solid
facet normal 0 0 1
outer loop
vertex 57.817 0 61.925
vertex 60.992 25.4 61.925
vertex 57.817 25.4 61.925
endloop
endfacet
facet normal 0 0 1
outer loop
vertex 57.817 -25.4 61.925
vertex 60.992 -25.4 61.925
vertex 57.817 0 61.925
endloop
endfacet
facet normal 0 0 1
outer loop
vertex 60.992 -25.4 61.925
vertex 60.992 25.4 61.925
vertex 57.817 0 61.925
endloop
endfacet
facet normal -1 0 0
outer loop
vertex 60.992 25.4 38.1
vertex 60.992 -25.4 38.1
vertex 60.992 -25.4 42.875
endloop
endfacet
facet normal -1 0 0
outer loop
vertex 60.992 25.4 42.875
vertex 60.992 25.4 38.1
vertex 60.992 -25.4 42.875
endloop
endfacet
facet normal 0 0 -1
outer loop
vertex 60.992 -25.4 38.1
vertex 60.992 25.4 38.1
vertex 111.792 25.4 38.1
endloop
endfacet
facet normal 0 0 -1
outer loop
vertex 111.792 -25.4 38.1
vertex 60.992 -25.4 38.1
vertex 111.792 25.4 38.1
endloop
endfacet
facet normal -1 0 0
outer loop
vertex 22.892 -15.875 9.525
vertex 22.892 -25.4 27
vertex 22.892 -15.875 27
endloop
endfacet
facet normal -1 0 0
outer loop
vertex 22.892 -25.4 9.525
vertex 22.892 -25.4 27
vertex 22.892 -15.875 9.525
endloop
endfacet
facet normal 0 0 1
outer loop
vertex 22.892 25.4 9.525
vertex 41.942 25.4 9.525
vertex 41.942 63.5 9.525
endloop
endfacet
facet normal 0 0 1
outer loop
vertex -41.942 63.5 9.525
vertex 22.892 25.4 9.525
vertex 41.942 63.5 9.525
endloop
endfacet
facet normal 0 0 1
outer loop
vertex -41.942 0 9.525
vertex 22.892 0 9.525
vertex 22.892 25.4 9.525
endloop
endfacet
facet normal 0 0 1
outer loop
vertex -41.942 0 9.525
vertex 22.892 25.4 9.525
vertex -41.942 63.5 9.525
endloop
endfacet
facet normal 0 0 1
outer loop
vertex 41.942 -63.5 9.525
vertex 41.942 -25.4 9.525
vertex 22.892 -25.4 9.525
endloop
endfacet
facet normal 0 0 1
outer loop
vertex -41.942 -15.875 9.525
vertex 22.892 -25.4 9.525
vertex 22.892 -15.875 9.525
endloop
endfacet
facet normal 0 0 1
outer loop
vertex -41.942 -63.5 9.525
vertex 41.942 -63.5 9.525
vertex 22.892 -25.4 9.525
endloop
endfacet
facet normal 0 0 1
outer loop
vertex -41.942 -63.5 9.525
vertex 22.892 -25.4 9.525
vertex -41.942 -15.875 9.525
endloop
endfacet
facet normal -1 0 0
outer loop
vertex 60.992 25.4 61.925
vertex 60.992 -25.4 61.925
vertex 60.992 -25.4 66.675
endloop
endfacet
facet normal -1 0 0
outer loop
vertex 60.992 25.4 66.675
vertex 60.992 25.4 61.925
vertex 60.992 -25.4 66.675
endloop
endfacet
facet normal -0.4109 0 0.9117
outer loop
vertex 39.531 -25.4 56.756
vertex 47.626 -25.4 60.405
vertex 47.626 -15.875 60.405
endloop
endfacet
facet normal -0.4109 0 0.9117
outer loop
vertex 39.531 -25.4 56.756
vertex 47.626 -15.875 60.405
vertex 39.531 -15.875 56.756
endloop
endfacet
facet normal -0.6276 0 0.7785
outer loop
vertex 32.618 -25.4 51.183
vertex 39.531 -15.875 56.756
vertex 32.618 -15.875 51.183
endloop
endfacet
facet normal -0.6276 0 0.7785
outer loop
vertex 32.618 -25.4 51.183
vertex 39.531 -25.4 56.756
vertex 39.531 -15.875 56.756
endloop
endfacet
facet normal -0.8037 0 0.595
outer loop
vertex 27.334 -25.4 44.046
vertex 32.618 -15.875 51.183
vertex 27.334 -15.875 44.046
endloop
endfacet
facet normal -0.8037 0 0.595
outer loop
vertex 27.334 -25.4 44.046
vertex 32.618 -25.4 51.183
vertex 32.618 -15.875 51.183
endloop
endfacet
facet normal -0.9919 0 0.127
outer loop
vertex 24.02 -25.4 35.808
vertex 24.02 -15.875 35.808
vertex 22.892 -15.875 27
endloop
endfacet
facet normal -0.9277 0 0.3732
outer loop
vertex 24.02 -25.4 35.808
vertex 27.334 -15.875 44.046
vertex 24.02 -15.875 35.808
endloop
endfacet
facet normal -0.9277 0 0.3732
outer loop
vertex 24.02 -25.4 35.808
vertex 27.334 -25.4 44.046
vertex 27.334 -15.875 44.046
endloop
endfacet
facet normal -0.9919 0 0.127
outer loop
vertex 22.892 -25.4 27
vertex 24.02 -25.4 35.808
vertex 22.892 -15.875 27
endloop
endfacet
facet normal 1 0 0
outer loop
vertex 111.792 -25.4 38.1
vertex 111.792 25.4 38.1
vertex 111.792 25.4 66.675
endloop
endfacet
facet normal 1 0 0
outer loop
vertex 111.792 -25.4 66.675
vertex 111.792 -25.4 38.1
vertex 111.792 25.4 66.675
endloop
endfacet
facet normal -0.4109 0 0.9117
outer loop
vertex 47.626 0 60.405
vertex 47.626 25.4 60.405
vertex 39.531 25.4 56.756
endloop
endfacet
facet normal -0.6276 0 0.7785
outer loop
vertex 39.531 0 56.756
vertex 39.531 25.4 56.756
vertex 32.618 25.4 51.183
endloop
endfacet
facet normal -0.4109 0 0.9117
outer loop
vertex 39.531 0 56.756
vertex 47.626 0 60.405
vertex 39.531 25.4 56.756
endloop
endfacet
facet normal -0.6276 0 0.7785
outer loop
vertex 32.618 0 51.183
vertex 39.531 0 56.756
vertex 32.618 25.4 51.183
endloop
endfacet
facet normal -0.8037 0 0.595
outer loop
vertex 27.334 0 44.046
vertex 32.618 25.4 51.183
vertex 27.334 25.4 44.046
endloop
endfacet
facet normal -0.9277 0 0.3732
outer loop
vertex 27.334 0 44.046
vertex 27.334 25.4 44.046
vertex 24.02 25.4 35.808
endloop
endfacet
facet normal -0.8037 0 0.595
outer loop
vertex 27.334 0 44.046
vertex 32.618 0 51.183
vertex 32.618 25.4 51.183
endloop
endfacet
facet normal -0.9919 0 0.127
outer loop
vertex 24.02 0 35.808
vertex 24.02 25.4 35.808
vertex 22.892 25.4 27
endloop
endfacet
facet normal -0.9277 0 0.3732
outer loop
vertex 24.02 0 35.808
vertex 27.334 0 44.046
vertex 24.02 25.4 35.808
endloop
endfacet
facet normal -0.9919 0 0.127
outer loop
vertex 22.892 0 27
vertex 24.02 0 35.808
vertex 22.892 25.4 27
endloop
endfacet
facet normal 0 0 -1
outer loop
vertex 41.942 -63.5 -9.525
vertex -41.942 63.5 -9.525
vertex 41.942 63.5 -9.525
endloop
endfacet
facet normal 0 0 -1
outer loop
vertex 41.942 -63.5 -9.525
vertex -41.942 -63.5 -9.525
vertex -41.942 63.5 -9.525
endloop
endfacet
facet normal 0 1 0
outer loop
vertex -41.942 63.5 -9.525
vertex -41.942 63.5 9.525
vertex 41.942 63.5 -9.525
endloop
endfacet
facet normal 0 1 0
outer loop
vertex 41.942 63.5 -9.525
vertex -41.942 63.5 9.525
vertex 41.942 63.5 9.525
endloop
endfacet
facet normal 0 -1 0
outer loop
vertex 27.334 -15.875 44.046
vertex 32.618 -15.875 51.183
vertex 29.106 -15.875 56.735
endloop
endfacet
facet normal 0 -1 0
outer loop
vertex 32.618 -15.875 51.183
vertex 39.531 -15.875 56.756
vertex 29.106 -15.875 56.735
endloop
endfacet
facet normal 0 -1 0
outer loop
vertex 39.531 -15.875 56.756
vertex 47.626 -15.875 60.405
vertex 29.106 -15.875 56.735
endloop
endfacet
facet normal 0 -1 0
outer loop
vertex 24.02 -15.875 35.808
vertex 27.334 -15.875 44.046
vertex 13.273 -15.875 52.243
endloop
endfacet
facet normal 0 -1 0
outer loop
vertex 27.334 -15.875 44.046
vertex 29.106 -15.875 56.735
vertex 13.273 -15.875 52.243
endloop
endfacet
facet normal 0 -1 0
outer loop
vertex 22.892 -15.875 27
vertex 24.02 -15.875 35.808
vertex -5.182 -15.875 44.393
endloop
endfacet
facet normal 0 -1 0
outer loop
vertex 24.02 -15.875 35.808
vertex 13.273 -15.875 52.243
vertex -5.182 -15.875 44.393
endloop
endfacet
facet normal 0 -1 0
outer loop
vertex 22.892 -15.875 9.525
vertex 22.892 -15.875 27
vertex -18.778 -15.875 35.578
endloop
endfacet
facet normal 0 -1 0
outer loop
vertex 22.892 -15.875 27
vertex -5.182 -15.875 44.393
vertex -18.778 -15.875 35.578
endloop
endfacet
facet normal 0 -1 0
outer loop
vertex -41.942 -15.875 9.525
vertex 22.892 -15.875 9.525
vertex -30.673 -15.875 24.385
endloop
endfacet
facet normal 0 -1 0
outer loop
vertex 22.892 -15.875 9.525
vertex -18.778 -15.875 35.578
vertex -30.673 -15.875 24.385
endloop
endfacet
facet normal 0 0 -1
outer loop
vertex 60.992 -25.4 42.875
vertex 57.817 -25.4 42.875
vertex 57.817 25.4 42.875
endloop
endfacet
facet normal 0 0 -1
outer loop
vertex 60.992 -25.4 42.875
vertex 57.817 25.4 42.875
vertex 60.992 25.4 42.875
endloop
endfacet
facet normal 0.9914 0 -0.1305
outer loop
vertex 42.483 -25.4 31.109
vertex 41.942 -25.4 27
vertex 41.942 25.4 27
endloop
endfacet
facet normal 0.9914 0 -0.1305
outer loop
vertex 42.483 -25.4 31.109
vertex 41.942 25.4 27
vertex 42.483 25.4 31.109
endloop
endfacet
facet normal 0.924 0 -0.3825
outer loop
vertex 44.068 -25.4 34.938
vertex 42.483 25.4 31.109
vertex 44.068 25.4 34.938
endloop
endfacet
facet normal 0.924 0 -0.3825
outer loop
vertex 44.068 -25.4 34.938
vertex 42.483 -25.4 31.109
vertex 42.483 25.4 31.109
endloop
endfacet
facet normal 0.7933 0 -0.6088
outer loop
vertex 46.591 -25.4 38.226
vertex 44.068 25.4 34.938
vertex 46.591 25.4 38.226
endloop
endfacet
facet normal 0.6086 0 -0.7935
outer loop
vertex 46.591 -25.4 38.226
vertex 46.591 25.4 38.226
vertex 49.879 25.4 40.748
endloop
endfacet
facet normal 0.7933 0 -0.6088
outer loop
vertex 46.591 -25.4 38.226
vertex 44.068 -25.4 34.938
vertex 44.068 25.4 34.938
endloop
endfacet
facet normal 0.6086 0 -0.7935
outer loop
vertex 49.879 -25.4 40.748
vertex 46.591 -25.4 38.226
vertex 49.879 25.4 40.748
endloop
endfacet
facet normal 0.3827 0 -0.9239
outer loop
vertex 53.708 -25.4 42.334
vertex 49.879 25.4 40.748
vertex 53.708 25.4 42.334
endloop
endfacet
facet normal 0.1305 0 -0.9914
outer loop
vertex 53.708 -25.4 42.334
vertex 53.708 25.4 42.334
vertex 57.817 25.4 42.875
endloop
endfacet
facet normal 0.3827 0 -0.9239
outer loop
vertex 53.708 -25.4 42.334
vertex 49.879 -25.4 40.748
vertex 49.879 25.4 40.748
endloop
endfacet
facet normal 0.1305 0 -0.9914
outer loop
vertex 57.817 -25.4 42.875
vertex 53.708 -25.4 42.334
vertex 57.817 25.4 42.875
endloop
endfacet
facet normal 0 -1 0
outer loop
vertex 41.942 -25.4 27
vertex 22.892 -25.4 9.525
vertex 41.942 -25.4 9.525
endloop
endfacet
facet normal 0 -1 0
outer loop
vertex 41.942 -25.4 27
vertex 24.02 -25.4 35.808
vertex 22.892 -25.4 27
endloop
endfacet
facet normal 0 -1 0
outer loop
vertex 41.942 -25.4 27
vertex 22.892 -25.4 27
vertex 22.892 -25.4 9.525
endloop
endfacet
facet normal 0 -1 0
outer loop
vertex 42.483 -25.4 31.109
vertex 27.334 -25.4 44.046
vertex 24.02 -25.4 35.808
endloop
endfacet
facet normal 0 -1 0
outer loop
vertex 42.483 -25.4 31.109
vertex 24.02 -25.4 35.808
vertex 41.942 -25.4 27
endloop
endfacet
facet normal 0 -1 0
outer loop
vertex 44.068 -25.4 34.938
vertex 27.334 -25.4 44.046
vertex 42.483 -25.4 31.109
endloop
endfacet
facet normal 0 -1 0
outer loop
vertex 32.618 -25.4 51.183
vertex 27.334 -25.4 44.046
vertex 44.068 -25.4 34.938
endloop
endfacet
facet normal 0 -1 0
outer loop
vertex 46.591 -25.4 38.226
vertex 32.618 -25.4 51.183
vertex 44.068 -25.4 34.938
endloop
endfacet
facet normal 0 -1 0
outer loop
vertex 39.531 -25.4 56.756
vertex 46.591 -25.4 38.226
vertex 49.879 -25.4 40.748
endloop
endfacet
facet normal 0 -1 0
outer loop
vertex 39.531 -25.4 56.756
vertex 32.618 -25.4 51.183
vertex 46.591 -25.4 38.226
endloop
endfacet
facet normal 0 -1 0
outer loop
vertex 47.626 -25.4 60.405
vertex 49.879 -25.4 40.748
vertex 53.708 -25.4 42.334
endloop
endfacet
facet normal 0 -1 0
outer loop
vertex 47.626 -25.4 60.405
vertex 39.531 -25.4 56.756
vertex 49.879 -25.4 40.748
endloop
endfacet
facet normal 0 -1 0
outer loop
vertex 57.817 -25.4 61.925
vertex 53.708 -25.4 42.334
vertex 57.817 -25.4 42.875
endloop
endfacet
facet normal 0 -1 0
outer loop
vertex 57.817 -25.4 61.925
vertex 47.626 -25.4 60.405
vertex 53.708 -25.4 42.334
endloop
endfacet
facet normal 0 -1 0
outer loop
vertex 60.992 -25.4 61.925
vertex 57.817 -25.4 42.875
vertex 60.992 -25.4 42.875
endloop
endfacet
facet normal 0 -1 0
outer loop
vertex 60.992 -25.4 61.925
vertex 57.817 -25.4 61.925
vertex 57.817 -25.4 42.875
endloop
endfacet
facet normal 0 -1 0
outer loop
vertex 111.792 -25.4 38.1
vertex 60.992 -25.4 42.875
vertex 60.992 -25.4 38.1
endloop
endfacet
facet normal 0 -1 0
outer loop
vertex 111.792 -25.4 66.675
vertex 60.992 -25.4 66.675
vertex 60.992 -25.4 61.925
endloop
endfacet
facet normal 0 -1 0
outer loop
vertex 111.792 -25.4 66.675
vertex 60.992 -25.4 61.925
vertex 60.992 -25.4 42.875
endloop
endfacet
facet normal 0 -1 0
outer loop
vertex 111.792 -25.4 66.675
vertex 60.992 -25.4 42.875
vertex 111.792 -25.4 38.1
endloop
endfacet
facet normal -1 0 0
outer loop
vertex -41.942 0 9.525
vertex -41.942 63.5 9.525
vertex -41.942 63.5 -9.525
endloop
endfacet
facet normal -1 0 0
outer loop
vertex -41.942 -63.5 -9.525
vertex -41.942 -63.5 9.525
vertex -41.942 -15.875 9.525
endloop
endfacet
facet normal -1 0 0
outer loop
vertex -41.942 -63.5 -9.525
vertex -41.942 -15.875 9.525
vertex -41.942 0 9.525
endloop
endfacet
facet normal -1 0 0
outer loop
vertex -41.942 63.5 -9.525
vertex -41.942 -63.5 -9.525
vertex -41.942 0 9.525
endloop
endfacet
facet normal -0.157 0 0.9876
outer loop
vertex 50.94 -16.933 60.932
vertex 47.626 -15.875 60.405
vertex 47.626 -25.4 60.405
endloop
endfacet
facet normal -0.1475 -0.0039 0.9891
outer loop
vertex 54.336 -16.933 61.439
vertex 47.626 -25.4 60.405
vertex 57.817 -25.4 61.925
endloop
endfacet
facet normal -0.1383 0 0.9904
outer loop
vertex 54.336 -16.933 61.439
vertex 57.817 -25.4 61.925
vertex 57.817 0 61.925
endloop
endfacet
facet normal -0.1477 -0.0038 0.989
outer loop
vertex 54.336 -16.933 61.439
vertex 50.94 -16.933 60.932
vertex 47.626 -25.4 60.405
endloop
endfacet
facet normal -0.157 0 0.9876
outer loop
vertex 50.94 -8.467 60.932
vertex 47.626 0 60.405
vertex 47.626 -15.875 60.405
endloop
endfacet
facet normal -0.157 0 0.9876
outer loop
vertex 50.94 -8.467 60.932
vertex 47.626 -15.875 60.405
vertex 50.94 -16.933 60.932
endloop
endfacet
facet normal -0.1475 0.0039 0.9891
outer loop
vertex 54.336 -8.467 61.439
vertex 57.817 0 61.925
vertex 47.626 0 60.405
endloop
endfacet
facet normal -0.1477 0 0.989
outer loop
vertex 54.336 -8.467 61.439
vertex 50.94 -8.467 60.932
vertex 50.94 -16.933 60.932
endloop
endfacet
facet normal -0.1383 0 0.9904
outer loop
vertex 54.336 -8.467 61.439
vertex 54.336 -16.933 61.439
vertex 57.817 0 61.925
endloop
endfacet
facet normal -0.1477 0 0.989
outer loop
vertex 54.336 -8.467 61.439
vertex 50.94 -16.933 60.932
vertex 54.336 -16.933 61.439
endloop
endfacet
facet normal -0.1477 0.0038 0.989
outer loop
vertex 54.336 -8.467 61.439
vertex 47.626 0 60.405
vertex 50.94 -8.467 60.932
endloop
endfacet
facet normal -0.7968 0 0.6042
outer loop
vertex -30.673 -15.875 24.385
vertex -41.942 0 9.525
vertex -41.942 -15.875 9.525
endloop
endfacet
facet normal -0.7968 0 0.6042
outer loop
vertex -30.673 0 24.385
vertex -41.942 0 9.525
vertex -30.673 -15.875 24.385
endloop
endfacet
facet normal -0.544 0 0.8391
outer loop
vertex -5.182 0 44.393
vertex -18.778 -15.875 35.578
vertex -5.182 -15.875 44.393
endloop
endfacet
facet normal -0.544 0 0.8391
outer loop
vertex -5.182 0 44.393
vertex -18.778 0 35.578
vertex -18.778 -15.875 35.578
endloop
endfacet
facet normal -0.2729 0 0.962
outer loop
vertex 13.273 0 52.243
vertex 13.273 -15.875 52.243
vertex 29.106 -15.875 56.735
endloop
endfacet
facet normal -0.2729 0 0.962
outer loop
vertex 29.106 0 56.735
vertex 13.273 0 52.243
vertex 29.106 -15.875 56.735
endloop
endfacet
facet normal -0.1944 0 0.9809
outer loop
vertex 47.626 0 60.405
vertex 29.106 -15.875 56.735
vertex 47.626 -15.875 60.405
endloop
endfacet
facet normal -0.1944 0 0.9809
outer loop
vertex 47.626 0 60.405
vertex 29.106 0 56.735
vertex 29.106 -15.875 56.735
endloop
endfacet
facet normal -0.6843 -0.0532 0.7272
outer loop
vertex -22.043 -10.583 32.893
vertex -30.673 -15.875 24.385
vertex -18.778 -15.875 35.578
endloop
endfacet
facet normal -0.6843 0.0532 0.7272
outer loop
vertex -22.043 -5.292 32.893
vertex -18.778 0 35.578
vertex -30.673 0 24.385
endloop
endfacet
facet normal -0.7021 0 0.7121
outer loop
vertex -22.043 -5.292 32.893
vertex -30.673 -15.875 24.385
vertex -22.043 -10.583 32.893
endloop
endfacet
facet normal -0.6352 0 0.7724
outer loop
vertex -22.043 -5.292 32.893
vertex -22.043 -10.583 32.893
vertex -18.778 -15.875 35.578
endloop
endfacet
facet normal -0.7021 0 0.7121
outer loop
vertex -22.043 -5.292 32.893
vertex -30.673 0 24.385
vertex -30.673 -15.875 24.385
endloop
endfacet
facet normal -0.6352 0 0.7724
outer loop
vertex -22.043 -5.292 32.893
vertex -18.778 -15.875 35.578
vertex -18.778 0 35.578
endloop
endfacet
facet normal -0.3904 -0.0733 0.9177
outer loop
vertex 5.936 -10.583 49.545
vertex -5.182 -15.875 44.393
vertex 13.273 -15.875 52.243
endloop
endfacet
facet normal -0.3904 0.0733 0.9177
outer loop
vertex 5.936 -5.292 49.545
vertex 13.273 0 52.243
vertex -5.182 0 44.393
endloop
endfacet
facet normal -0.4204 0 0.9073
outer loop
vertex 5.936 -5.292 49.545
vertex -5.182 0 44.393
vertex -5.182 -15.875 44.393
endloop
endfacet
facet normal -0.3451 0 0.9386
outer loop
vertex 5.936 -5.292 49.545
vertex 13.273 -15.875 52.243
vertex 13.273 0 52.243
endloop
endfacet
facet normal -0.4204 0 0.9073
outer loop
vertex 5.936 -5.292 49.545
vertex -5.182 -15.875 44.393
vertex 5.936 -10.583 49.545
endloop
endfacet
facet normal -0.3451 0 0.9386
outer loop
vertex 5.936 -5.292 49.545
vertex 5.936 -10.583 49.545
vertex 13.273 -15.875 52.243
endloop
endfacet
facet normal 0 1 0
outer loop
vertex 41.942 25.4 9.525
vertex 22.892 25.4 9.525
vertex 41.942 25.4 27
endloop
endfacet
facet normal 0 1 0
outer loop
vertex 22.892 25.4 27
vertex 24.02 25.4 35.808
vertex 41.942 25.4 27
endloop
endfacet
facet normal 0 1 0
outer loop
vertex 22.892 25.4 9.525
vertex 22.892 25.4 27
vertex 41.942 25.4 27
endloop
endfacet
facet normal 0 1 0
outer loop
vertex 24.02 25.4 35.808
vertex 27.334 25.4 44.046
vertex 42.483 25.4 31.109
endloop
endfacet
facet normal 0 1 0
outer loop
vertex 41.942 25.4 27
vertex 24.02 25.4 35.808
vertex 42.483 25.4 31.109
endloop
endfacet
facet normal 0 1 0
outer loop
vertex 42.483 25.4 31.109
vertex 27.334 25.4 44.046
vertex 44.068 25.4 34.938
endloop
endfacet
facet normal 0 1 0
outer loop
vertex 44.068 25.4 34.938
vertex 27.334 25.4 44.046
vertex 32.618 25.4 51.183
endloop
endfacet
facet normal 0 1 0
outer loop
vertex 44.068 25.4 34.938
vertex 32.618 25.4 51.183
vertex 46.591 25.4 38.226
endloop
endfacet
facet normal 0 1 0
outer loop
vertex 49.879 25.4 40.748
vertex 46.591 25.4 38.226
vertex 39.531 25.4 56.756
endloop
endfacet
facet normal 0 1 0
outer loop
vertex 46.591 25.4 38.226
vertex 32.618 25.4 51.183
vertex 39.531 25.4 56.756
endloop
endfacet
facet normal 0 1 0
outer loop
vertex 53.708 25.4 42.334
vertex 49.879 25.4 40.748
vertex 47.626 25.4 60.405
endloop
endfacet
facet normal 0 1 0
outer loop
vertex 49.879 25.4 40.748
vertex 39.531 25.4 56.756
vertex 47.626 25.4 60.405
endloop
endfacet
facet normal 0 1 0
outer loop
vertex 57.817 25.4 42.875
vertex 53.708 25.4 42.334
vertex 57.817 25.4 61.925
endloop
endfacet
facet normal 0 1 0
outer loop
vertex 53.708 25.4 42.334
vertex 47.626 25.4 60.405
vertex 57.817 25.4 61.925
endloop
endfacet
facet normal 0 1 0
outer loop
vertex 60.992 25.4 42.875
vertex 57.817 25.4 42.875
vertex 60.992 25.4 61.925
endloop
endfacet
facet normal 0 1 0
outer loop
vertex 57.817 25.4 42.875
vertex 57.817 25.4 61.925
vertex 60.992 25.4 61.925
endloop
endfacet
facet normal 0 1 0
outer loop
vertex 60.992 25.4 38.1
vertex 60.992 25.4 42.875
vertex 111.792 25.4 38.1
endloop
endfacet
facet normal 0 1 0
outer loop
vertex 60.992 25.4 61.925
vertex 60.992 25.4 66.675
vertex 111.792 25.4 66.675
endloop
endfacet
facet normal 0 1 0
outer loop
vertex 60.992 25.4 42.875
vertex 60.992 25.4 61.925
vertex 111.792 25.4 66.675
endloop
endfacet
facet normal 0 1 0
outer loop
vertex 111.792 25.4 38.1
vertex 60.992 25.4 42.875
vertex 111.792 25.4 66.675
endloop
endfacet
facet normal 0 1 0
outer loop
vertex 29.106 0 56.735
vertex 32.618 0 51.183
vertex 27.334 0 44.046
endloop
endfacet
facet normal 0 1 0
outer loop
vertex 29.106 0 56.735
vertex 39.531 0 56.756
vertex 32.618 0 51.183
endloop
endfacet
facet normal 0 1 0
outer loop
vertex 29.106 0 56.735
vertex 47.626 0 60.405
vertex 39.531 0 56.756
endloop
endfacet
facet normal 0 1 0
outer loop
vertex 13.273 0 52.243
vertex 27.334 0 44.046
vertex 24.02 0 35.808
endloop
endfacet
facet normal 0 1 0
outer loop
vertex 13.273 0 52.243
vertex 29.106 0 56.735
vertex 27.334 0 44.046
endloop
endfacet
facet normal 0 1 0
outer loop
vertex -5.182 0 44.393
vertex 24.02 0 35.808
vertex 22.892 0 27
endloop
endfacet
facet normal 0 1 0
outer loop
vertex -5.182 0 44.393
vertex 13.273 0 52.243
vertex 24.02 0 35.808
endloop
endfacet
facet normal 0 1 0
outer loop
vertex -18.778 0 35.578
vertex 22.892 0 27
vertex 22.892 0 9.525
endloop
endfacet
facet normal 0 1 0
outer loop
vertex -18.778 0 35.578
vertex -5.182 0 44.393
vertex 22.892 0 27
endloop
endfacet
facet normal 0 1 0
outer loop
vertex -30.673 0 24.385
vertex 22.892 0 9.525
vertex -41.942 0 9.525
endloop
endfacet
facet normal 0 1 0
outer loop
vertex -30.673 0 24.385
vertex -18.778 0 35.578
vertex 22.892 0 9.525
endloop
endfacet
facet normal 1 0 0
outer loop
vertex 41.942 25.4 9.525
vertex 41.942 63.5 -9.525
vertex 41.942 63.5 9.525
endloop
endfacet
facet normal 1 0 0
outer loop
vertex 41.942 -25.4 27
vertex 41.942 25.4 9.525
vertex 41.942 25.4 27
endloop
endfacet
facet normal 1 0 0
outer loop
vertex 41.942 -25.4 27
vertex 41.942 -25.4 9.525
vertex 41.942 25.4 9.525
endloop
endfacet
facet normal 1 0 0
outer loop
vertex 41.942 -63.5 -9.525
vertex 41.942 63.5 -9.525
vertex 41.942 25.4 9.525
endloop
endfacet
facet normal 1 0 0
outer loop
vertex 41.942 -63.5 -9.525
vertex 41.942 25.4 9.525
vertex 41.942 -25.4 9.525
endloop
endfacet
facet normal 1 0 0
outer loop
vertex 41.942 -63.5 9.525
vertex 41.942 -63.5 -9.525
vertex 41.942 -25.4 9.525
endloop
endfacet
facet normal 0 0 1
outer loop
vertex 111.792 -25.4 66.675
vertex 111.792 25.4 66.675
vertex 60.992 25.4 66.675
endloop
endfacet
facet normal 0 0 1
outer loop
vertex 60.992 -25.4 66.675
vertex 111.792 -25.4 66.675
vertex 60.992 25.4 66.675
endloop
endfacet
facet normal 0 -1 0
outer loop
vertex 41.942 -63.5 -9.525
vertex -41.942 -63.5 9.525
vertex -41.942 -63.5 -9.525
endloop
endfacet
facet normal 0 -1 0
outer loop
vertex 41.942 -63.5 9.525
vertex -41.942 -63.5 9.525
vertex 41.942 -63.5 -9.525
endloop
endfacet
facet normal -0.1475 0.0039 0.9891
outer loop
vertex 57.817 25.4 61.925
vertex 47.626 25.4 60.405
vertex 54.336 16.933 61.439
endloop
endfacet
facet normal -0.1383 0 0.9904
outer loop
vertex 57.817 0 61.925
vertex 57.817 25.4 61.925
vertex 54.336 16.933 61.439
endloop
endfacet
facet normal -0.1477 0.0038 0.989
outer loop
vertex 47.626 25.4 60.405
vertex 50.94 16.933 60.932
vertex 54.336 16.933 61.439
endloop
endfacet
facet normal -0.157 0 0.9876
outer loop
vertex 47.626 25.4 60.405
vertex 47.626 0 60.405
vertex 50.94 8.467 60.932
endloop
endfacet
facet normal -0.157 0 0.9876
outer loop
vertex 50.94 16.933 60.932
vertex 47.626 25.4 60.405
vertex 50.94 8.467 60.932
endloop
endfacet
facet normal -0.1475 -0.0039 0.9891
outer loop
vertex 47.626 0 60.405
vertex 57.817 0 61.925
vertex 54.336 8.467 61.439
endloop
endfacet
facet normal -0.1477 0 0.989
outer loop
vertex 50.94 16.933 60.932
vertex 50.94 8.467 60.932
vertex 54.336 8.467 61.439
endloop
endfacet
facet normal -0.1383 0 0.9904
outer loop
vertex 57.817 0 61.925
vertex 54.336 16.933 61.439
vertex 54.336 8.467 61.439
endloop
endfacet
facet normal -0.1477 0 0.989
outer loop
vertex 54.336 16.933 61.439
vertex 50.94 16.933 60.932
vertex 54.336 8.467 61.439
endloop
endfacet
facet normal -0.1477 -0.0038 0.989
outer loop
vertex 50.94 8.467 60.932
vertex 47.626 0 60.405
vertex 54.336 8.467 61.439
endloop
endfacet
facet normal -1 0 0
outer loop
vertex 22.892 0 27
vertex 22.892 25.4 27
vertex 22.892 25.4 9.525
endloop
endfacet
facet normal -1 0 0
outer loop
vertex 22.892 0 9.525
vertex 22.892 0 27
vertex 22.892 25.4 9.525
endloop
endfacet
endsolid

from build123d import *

# Parameters (mm, degrees)
F1_DEPTH = 63.5
F0_W     = 25.4
F0_H     = 4.7752
F0_H_2   = 4.7498
F0_H_3   = 19.05
F2_DEPTH = 25.4
F3_DEPTH = 15.875


with BuildPart() as f1:
    # F0 (on Front) → F1 (new body, symmetric)
    with BuildSketch(Plane.XZ):
        Polygon((-41.9416204095, -9.525), (41.9416204095, -9.525), (41.9416204095, 9.525), (22.8916204095, 9.525), (-41.9416204095, 9.525), align=None)
    extrude(amount=F1_DEPTH, both=True)

    # F0 (on Front) → F2 (join, symmetric)
    with BuildSketch(Plane.XZ):
        with BuildLine():
            Line((22.8916204095, 9.525), (41.9416204095, 9.525))
            Line((41.9416204095, 9.525), (41.9416204095, 27.0002))
            ThreePointArc((41.9416204095, 27.0002), (46.5913002582, 38.2255201513), (57.8166204095, 42.8752))
            Line((57.8166204095, 42.8752), (60.9916204095, 42.8752))
            Line((60.9916204095, 42.8752), (60.9916204095, 61.9252))
            Line((60.9916204095, 61.9252), (57.8166204095, 61.9252))
            add(Edge.make_bspline(
                [(47.6262813731, 60.4054782554), (50.8985735157, 60.9424204342), (54.2930453114, 61.4486153253), (57.8166204095, 61.9252)],
                knots=[105.8157704089, 105.8157704089, 105.8157704089, 105.8157704089, 112.6831290448, 112.6831290448, 112.6831290448, 112.6831290448], degree=3))
            ThreePointArc((47.6262813731, 60.4054782554), (29.7483713026, 47.7831020369), (22.8916204095, 27.0002))
            Line((22.8916204095, 27.0002), (22.8916204095, 9.525))
        make_face()
        with Locations((73.6916204095, 40.4876)):
            Rectangle(F0_W, F0_H)
        with Locations((73.6916204095, 64.3001)):
            Rectangle(F0_W, F0_H_2)
        with Locations((73.6916204095, 52.4002)):
            Rectangle(F0_W, F0_H_3)
        Polygon((86.3916204095, 61.9252), (86.3916204095, 42.8752), (86.3916204095, 38.1), (111.7916204095, 38.1), (111.7916204095, 66.675), (86.3916204095, 66.675), align=None)
    extrude(amount=F2_DEPTH, both=True)

    # F0 (on Front) → F3 (join)
    with BuildSketch(Plane.XZ):
        with BuildLine():
            add(Edge.make_bspline(
                [(-41.9416204095, 9.525), (-24.2078539178, 36.5584305008), (-2.7948677813, 52.1319988404), (47.6262813731, 60.4054782554)],
                knots=[0, 0, 0, 0, 105.8157704089, 105.8157704089, 105.8157704089, 105.8157704089], degree=3))
            Line((-41.9416204095, 9.525), (22.8916204095, 9.525))
            Line((22.8916204095, 9.525), (22.8916204095, 27.0002))
            ThreePointArc((22.8916204095, 27.0002), (29.7483713026, 47.7831020369), (47.6262813731, 60.4054782554))
        make_face()
    extrude(amount=F3_DEPTH)


solid = f1.part
